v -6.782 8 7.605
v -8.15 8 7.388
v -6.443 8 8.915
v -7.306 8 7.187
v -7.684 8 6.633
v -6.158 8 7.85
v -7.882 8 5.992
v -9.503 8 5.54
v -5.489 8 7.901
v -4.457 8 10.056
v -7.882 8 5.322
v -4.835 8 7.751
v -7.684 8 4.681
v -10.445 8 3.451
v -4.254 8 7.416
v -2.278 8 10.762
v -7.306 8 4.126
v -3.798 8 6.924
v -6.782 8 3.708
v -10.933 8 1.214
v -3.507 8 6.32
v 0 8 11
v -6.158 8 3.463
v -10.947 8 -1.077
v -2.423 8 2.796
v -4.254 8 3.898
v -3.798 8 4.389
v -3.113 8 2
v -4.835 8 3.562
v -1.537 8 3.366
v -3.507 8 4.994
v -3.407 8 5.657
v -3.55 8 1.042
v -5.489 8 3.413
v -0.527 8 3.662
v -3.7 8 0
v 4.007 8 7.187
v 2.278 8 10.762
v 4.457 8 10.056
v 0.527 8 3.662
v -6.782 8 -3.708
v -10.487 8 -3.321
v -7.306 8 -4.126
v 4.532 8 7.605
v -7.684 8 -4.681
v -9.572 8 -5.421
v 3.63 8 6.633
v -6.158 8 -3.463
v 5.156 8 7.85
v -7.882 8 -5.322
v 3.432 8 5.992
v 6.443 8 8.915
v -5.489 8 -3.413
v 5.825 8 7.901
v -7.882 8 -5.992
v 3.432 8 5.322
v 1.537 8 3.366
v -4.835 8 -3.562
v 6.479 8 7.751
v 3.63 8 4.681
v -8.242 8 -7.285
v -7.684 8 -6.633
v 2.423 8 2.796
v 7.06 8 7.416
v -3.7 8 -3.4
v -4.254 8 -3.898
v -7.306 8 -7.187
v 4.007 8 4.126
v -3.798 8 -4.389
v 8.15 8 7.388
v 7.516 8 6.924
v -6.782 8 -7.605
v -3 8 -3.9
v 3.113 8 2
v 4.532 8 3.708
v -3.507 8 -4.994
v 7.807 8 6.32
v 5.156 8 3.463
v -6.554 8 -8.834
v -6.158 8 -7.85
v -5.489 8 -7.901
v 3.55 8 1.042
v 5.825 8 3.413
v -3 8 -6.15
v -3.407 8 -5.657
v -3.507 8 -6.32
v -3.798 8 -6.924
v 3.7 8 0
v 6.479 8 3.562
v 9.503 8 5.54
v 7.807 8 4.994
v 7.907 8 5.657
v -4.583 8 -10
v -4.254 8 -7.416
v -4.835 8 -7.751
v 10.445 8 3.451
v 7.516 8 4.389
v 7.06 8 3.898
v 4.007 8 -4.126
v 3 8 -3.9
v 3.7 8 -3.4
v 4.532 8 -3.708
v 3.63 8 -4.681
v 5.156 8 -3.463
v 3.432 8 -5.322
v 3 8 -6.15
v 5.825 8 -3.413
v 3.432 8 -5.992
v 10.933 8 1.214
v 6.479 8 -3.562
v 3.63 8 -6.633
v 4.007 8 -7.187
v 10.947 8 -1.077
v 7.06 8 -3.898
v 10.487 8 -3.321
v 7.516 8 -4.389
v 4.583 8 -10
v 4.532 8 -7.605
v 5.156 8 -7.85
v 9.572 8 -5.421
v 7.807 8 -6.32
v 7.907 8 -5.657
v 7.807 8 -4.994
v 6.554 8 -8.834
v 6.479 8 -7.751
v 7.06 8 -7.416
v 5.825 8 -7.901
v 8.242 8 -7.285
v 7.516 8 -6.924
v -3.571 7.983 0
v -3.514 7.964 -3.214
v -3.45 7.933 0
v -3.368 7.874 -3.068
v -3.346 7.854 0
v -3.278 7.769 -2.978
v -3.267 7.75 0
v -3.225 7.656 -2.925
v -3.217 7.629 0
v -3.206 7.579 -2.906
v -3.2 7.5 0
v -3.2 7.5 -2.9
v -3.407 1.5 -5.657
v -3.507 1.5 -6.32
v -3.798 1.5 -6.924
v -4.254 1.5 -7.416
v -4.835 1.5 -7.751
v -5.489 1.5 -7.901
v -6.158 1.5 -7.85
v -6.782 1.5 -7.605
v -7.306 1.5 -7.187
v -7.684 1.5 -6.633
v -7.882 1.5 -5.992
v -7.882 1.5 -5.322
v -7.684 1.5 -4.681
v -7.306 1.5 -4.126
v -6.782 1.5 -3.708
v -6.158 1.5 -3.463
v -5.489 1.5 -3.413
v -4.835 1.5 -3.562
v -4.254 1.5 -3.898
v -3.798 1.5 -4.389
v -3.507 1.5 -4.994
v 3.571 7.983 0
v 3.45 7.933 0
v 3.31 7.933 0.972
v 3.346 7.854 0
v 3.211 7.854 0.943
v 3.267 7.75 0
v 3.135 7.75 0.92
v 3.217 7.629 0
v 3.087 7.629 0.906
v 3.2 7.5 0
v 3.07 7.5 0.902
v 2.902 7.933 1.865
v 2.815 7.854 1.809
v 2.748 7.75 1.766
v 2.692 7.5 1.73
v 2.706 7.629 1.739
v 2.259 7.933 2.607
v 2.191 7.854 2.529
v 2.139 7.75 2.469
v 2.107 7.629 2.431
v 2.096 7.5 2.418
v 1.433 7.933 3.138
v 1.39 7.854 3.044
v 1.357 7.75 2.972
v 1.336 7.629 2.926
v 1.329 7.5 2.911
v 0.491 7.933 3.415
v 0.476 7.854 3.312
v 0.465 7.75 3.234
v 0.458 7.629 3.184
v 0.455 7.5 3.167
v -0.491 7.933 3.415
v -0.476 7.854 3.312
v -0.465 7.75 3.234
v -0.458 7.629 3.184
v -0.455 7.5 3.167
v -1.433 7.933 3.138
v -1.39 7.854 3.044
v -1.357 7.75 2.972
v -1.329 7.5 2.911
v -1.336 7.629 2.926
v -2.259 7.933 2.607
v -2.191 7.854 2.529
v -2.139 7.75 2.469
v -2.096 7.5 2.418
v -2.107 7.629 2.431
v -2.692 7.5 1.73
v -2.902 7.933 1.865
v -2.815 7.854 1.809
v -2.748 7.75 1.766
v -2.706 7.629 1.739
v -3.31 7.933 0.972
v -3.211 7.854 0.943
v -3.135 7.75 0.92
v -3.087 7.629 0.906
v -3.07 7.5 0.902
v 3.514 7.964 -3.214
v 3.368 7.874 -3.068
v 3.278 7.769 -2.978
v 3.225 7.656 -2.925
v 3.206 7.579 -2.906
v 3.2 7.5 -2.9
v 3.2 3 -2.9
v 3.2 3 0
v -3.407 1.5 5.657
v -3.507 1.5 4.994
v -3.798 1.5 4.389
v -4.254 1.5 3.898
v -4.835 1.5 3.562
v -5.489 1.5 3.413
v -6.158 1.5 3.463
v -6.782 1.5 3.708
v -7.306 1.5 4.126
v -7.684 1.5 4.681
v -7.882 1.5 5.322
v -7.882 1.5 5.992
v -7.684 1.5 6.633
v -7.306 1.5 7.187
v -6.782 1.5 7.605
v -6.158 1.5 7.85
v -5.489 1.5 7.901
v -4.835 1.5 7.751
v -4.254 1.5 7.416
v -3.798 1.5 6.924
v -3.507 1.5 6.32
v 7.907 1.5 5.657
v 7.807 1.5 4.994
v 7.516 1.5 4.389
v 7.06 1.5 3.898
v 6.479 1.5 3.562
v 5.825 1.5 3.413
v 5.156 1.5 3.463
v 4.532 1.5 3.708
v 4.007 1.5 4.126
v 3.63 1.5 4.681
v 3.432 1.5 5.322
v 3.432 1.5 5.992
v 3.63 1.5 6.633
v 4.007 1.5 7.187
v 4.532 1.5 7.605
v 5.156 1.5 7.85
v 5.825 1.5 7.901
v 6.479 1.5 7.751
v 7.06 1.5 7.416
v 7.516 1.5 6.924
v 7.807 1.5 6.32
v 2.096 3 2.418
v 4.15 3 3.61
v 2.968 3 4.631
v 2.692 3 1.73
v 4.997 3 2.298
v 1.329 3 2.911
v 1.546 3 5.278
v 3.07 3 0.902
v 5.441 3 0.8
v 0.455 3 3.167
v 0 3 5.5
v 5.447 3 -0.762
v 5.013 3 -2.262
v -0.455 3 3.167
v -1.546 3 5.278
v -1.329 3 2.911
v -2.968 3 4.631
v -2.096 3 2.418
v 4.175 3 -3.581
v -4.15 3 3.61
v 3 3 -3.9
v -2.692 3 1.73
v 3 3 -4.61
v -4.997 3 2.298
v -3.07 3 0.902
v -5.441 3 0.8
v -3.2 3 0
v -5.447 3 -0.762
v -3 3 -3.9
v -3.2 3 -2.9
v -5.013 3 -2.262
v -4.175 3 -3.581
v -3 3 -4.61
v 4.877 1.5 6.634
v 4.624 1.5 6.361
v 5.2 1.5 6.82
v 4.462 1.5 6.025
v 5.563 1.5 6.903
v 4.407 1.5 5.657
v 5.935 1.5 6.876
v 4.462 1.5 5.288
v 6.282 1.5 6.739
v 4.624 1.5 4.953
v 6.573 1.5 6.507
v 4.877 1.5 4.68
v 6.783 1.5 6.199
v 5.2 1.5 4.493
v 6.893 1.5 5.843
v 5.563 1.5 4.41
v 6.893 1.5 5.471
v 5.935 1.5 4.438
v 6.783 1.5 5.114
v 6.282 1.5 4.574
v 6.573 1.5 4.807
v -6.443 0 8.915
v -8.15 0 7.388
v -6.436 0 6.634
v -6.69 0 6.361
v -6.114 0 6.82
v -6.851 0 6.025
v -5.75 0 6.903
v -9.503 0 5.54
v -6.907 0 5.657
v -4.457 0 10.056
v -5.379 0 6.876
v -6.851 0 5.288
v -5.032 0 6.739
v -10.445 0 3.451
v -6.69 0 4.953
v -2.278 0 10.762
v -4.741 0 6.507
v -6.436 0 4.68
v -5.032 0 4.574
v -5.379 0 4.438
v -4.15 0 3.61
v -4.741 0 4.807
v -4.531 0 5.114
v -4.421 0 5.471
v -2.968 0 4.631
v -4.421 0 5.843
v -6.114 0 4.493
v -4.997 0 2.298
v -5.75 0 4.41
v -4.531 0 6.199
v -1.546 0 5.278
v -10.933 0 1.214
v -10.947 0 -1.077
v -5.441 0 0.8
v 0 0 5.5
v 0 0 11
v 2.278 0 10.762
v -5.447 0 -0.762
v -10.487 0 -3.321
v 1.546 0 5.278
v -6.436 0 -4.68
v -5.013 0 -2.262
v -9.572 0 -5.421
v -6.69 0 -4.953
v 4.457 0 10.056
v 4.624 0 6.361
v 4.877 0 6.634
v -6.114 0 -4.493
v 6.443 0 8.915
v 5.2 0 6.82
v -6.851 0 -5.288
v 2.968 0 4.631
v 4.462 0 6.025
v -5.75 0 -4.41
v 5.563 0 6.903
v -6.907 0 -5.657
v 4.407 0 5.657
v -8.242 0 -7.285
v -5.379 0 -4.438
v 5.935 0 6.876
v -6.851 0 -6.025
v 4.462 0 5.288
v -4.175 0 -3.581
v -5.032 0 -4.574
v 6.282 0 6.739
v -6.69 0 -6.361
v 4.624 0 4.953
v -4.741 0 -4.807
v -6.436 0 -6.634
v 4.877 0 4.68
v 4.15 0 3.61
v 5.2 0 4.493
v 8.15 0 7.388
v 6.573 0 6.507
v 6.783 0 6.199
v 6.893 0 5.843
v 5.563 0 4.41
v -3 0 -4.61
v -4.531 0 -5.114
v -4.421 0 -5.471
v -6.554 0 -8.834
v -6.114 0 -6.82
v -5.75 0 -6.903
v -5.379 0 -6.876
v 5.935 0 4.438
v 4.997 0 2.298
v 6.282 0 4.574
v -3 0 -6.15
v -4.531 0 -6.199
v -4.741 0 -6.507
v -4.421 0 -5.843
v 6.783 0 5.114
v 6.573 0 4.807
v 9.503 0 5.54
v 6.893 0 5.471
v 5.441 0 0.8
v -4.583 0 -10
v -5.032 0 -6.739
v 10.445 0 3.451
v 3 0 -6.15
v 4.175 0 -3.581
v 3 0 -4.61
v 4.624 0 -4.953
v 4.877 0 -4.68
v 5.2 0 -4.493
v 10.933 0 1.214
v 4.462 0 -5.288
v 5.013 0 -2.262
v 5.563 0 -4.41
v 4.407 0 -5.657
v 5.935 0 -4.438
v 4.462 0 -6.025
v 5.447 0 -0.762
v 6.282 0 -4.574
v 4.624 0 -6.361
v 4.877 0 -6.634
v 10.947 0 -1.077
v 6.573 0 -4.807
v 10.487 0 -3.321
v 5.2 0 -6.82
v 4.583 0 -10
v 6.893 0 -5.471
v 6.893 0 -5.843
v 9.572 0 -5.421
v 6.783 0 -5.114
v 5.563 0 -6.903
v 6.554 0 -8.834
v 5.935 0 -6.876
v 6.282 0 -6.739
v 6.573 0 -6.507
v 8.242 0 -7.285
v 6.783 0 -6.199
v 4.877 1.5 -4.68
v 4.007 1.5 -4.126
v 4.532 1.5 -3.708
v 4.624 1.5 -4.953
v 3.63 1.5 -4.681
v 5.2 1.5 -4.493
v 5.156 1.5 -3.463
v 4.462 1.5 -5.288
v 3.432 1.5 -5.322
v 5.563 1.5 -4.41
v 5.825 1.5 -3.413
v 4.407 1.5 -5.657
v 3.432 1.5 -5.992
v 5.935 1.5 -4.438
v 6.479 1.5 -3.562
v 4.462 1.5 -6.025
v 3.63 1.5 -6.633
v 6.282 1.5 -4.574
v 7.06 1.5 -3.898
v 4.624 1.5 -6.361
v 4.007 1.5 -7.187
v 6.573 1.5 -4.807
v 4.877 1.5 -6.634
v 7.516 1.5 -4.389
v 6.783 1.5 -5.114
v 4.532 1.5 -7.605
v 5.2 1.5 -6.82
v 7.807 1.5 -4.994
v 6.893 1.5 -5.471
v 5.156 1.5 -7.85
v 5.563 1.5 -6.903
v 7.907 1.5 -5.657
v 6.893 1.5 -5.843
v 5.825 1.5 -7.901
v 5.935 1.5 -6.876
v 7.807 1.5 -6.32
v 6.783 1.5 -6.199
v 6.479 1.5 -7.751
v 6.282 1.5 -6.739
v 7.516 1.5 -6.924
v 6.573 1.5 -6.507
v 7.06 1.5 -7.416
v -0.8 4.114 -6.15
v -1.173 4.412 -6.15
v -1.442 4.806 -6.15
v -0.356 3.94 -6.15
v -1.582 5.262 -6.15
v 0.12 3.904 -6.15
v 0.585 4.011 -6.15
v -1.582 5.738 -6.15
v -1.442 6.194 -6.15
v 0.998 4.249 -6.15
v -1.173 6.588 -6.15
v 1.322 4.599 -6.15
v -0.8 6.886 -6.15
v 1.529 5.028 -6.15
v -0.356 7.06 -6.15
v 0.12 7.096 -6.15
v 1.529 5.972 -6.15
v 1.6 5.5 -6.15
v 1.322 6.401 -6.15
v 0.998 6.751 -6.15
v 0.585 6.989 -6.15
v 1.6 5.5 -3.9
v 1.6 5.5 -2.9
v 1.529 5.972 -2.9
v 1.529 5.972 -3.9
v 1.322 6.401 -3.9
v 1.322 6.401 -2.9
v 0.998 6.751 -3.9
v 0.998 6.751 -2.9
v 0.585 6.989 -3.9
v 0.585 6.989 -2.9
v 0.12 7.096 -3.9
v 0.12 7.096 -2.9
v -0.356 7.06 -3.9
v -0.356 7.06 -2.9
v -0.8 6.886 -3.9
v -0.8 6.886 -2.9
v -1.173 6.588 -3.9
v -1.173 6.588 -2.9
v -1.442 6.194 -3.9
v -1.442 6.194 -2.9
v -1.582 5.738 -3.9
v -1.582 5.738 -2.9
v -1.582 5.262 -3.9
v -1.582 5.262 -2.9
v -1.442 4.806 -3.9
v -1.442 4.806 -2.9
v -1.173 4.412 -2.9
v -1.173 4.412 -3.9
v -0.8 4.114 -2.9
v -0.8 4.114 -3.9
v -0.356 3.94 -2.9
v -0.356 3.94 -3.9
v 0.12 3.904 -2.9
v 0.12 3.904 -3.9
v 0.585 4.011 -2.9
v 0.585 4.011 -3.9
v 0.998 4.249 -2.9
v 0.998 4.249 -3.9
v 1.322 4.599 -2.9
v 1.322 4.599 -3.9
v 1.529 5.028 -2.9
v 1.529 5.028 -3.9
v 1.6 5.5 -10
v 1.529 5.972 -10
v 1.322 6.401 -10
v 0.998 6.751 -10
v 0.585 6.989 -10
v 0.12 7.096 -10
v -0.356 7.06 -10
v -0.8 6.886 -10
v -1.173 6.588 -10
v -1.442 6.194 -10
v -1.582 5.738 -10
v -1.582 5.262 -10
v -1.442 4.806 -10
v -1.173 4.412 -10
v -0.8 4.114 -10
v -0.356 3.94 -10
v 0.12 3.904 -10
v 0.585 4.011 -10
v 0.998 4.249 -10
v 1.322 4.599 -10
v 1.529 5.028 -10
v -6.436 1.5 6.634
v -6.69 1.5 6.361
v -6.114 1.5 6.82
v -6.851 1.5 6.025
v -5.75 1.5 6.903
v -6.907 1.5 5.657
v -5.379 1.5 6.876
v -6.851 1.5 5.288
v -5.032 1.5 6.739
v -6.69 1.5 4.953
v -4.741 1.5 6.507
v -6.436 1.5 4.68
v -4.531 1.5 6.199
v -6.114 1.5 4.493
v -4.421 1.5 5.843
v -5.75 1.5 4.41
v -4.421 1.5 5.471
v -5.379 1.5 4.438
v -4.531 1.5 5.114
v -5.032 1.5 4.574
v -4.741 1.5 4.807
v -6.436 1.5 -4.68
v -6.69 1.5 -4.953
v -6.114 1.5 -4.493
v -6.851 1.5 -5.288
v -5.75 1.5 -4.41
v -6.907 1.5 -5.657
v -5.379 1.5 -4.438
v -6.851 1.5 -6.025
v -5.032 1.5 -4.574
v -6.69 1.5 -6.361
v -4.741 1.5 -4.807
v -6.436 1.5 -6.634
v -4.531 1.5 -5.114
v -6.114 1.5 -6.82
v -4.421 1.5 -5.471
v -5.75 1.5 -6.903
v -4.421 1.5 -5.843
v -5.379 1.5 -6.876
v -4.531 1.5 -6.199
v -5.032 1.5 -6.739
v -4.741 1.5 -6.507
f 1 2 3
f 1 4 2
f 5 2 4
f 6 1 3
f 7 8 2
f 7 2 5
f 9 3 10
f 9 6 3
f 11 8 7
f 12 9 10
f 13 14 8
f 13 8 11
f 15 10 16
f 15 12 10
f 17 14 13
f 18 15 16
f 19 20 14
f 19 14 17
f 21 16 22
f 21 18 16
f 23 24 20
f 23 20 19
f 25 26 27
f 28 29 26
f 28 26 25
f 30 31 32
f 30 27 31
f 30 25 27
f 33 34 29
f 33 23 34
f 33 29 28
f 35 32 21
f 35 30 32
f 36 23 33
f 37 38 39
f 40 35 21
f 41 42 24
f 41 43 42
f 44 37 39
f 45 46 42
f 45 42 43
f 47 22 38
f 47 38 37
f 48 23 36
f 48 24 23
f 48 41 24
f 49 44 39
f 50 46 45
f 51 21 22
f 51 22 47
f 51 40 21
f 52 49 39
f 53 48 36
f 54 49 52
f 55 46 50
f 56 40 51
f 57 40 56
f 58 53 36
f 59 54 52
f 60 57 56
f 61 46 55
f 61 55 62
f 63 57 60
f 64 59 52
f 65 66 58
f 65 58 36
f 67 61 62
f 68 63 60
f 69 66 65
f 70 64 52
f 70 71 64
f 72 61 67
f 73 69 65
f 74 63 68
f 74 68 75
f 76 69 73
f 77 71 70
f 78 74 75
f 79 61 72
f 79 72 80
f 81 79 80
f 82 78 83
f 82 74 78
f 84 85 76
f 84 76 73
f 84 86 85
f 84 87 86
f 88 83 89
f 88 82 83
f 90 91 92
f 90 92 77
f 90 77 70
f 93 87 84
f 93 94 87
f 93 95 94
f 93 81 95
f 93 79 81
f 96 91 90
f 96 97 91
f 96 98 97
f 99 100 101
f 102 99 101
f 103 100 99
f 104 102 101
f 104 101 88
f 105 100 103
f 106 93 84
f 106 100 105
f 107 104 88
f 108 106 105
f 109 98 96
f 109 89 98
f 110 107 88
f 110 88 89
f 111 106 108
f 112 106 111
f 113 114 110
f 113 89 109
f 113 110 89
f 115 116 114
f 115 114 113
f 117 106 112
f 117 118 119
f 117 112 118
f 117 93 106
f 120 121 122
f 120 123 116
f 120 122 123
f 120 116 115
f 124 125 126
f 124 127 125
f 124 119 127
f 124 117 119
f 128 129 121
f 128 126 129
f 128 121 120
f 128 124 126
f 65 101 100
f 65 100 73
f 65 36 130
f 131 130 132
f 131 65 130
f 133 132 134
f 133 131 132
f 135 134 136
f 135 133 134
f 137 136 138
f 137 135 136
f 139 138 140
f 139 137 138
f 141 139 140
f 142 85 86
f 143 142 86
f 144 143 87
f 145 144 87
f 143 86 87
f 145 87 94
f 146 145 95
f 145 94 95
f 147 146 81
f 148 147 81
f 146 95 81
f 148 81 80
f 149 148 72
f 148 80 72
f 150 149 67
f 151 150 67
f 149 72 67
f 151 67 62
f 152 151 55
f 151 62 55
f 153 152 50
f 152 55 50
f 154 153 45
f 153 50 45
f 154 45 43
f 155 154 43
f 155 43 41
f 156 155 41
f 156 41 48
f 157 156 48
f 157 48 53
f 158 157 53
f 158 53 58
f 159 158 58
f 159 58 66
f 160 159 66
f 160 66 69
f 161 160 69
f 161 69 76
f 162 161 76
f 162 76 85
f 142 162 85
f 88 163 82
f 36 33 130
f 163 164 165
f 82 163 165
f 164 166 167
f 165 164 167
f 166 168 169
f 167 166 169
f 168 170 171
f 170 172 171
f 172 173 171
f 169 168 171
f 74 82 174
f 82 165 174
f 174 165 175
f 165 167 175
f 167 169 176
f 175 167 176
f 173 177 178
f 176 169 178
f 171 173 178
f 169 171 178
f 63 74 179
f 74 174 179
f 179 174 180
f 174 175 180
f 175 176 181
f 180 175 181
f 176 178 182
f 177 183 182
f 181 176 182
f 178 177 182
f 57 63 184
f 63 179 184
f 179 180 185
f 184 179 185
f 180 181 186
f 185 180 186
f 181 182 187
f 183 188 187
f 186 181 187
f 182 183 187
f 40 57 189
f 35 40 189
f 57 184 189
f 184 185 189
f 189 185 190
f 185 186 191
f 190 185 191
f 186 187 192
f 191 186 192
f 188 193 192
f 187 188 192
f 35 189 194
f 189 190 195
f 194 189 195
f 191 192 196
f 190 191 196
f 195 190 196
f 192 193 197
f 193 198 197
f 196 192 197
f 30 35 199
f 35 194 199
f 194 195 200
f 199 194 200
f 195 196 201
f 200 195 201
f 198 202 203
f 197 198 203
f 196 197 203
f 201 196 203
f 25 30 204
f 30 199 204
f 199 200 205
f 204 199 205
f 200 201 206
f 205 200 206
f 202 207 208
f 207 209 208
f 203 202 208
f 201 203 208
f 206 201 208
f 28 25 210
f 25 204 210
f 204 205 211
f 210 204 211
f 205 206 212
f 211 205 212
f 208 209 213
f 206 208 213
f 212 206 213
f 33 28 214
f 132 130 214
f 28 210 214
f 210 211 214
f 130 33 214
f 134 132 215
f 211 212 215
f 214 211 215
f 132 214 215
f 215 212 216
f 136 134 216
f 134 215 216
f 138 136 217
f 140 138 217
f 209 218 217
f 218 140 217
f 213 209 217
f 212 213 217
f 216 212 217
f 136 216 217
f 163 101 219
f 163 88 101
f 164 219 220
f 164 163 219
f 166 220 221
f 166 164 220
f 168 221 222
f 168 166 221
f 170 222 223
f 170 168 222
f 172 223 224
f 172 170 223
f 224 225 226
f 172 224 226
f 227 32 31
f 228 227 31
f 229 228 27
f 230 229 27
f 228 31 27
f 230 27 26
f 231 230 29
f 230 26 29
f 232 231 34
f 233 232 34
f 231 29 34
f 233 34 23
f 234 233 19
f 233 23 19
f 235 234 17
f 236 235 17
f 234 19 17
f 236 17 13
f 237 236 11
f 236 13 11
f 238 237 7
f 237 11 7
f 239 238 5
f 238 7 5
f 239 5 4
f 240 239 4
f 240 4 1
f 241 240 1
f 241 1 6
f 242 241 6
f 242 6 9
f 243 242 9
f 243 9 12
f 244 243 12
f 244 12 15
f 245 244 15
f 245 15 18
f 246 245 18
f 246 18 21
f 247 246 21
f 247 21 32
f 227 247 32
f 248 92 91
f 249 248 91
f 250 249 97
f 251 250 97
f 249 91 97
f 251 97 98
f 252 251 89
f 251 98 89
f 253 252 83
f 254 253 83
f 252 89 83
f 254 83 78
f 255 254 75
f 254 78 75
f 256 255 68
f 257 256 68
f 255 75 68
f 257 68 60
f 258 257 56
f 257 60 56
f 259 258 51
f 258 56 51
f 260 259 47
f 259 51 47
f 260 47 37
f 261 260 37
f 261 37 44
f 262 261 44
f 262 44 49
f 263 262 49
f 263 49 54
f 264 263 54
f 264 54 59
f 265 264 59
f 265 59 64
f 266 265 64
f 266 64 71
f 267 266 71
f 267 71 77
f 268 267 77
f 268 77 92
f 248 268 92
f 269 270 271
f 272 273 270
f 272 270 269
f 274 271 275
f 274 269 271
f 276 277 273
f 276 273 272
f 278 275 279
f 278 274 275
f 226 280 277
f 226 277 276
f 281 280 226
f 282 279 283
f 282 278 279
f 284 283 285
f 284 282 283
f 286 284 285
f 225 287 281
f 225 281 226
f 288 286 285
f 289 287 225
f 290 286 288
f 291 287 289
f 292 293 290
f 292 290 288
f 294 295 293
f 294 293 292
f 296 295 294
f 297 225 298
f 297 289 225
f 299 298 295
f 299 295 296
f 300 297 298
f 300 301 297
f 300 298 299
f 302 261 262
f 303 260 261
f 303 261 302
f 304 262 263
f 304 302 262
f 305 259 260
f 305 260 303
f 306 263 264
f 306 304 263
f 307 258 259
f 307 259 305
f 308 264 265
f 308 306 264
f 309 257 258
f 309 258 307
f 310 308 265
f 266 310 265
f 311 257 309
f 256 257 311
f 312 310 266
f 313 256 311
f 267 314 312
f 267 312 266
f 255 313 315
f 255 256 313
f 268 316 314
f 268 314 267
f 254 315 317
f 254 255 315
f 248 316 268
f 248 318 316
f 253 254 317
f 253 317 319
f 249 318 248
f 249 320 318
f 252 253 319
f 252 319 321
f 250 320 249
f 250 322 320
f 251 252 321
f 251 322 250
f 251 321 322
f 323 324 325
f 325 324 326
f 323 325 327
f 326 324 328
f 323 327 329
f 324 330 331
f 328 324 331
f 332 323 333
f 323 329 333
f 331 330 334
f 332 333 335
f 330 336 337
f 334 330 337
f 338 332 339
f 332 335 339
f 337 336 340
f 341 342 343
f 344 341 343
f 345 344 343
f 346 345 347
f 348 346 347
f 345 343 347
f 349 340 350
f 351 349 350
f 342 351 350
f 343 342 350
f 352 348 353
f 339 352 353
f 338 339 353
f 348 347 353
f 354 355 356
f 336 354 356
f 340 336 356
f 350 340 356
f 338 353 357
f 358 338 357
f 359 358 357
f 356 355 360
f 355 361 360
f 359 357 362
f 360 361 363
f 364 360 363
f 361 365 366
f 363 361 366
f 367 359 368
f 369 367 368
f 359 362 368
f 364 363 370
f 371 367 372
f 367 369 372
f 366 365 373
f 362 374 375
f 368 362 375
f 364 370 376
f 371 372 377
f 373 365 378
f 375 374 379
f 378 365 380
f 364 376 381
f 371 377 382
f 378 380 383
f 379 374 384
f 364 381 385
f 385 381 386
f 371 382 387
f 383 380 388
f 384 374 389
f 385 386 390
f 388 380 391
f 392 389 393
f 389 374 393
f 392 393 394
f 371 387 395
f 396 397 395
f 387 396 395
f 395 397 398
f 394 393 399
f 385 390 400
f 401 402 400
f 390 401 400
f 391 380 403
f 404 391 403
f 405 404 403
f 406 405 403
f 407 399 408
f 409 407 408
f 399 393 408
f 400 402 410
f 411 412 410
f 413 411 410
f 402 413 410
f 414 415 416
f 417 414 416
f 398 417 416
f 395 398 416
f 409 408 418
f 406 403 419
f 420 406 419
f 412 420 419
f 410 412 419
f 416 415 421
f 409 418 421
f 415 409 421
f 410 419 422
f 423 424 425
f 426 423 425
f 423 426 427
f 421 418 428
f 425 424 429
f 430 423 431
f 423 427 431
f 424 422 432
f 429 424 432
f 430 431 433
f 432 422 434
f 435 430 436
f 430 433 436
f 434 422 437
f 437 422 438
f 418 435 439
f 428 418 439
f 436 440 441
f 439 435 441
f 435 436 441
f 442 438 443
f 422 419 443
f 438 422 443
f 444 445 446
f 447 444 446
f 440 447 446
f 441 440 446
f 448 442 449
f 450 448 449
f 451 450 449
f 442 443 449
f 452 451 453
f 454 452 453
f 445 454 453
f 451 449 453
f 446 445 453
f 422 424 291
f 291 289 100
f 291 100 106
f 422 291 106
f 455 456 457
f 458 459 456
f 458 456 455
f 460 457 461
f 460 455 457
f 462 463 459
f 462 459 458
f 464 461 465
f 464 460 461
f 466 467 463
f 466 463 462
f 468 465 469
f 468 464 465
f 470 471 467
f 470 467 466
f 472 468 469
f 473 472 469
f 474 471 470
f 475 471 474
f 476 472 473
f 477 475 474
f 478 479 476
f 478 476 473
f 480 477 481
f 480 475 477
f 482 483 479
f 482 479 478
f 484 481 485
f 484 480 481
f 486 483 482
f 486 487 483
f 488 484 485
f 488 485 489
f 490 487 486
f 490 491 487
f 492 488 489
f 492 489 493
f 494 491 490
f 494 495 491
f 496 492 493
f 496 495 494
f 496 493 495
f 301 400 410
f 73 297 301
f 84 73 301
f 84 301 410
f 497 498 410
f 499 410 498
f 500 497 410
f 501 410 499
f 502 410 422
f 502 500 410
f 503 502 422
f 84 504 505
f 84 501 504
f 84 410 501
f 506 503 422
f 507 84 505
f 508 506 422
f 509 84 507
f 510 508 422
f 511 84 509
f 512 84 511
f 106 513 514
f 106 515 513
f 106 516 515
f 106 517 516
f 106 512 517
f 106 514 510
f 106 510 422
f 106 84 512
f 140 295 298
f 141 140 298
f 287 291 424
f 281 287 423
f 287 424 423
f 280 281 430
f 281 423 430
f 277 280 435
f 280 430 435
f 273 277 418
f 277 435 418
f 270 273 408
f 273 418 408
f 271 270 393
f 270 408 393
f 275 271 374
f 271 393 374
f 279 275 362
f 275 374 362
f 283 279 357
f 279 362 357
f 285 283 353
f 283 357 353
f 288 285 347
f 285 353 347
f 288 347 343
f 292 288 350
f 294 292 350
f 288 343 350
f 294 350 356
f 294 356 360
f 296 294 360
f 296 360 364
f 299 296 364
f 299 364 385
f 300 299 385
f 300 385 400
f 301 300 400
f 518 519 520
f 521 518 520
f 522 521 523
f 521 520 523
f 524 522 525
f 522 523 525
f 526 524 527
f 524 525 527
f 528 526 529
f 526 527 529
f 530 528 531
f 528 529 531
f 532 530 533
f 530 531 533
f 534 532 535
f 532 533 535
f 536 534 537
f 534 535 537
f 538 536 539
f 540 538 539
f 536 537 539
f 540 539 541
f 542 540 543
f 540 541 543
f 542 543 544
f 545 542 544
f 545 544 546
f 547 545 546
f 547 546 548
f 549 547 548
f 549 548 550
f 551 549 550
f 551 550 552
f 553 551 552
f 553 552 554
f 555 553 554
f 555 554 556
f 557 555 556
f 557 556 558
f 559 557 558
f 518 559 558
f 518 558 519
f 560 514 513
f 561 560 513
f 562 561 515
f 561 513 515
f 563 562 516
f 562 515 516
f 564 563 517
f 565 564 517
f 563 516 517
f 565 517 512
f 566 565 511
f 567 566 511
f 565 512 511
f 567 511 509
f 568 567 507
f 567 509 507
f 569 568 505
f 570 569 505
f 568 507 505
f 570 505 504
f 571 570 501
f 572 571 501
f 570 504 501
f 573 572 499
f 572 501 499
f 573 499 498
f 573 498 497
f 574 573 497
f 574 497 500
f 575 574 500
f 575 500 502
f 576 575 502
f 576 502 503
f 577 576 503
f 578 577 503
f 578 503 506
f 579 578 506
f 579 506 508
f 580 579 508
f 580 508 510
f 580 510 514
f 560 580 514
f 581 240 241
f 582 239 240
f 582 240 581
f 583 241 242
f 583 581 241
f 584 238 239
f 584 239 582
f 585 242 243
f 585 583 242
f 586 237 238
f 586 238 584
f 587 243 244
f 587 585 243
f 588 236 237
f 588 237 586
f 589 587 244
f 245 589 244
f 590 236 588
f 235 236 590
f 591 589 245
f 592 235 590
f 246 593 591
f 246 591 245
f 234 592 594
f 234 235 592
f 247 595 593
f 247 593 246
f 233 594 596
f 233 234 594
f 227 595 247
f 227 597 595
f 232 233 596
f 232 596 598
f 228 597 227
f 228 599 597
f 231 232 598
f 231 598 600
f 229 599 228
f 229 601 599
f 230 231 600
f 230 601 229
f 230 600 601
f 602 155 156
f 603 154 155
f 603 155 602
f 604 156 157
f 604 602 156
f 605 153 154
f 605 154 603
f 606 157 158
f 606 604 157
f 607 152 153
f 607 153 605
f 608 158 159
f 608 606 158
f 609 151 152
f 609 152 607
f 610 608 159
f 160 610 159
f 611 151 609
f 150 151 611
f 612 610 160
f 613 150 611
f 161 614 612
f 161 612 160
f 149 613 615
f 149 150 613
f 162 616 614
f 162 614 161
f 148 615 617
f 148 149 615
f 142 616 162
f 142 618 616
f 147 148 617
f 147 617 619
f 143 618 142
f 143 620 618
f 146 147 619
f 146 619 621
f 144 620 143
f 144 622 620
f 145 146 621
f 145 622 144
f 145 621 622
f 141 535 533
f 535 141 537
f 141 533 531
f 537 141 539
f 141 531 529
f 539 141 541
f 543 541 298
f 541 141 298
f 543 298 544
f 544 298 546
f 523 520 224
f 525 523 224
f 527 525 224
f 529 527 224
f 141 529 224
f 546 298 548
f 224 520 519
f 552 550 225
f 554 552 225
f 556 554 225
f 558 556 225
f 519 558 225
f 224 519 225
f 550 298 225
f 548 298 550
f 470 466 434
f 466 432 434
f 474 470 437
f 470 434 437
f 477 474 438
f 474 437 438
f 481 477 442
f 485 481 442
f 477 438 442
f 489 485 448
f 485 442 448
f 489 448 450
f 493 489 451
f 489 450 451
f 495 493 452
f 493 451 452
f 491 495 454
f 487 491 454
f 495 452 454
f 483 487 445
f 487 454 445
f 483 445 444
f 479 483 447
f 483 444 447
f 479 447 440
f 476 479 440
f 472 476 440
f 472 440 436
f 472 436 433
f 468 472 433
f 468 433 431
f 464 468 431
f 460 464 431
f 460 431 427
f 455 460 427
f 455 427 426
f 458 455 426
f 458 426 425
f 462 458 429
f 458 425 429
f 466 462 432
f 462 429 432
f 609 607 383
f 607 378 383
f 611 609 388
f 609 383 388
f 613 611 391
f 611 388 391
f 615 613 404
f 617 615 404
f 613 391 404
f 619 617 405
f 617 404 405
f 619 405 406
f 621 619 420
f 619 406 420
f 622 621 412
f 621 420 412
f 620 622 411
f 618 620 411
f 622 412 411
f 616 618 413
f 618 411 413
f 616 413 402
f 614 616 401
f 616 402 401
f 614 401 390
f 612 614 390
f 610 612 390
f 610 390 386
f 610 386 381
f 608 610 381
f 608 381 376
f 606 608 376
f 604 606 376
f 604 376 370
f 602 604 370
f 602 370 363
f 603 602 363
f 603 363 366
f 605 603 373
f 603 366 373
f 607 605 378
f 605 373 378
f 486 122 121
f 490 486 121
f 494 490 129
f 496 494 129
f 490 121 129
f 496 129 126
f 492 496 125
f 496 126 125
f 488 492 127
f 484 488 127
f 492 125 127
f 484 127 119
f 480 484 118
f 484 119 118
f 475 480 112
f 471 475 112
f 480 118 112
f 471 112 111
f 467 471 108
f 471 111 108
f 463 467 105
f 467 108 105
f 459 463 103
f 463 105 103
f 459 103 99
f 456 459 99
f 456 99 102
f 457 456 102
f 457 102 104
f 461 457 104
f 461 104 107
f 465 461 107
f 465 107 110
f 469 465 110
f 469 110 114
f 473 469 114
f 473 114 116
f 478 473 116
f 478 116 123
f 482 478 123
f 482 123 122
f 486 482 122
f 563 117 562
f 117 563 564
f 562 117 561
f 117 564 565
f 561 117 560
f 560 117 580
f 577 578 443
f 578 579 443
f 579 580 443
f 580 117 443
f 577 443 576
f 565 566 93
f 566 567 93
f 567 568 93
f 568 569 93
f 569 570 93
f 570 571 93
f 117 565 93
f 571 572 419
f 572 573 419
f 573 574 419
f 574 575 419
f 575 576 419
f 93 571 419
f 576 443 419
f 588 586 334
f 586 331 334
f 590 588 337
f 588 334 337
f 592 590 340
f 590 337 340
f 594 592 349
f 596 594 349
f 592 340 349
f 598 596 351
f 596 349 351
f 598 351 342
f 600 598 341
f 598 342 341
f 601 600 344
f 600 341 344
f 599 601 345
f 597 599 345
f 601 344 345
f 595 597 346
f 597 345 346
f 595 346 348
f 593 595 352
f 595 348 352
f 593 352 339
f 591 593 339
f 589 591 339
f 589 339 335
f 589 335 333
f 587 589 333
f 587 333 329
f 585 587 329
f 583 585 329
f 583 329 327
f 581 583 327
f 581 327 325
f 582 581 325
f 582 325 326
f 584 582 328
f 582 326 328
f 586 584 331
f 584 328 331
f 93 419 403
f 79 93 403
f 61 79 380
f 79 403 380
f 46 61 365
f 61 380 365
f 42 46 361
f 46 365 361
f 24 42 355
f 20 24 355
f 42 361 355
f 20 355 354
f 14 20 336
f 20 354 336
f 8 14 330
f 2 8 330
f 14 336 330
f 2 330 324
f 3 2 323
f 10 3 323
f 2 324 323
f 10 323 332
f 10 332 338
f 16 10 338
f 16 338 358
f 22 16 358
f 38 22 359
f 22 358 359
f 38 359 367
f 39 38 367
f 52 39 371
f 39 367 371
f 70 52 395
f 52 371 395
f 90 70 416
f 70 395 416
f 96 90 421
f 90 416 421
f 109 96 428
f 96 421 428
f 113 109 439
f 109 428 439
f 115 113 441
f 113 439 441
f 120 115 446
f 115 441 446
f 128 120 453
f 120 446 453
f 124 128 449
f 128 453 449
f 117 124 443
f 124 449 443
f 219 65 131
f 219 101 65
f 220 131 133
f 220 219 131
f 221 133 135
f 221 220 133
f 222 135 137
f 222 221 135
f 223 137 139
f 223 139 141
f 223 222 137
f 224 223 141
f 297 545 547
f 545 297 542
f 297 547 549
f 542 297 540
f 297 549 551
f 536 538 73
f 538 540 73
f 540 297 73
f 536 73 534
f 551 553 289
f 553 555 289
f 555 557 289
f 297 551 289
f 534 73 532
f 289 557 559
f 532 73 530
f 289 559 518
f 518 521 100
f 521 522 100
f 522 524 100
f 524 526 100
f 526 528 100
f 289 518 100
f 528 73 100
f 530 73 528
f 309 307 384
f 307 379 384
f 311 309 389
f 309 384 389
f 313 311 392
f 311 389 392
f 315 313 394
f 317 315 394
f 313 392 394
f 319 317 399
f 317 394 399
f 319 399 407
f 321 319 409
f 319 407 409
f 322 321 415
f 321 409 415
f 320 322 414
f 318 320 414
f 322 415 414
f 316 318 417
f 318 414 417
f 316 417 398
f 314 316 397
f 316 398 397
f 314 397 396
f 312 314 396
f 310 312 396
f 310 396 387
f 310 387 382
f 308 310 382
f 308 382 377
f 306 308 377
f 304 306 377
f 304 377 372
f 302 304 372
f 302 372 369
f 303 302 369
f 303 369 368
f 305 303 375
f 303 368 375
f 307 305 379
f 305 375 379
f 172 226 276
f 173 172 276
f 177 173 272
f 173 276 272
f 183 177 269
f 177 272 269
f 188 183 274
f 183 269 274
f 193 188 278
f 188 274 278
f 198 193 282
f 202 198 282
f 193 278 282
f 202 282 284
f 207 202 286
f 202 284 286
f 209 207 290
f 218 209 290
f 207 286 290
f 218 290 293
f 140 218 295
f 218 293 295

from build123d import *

# Parameters (mm, degrees)
BOSS_EXTRU_1_DEPTH                              = 8
CHAMBRAGE_POUR_VIS_T_TE_CYLINDRIQUE_D           = 2.5
CHAMBRAGE_POUR_VIS_T_TE_CYLINDRIQUE_CBORE_D     = 4.5
CHAMBRAGE_POUR_VIS_T_TE_CYLINDRIQUE_CBORE_DEPTH = 6.5
CONG_1_R                                        = 0.5
ESQUISSE6_R                                     = 1.6
ENL_V_MAT_EXTRU_1_DEPTH                         = 18.49285573
ESQUISSE7_W                                     = 6
ESQUISSE7_H                                     = 2.25
ENL_V_MAT_EXTRU_2_DEPTH                         = 18.492855685
ESQUISSE8_R                                     = 5.5
ENL_V_MAT_EXTRU_3_DEPTH                         = 3


with BuildPart() as part:
    # Esquisse1 → Boss.-Extru.1 (new body)
    with BuildSketch(Plane(origin=(0, 0, 0), x_dir=(1, 0, 0), z_dir=(0, 1, 0))):
        with BuildLine():
            Line((4.582575695, 10), (-4.582575695, 10))
            ThreePointArc((-4.582575695, 10), (0, -11), (4.582575695, 10))
        make_face()
        with BuildLine():
            Line((-3.2, 0), (-3.2, 2.9))
            Line((-3.2, 2.9), (3.2, 2.9))
            Line((3.2, 2.9), (3.2, 0))
            ThreePointArc((3.2, 0), (0, -3.2), (-3.2, 0))
        make_face(mode=Mode.SUBTRACT)
    extrude(amount=BOSS_EXTRU_1_DEPTH)

    # Chambrage pour vis à tête cylindrique à 6 pans creux (ou vis CHC) M21 (through all)
    with Locations(Plane(origin=(0, 8, 0), x_dir=(1, 0, 0), z_dir=(0, 1, 0))):
        with Locations((5.656854249, 5.656854249), (5.656854249, -5.656854249), (-5.656854249, -5.656854249), (-5.656854249, 5.656854249), (0, 0)):
            CounterBoreHole(CHAMBRAGE_POUR_VIS_T_TE_CYLINDRIQUE_D / 2, CHAMBRAGE_POUR_VIS_T_TE_CYLINDRIQUE_CBORE_D / 2, CHAMBRAGE_POUR_VIS_T_TE_CYLINDRIQUE_CBORE_DEPTH)

    # Congé1
    cong_1_edges = [part.edges().sort_by_distance(p)[0] for p in [
        (0, 8, 3.2),
        (3.2, 8, -1.45),
        (0, 8, -2.9),
        (-3.2, 8, -1.45),
    ]]
    fillet(cong_1_edges, radius=CONG_1_R)

    # Esquisse6 → Enlèv. mat.-Extru.1 (cut, through all)
    with BuildSketch(Plane.XY):
        with Locations((0, 5.5)):
            Circle(ESQUISSE6_R)
    extrude(amount=-ENL_V_MAT_EXTRU_1_DEPTH, mode=Mode.SUBTRACT)

    # Esquisse7 → Enlèv. mat.-Extru.2 (cut, through all)
    with BuildSketch(Plane(origin=(0, 8, 0), x_dir=(1, 0, 0), z_dir=(0, 1, 0))):
        with Locations((0, 5.025)):
            Rectangle(ESQUISSE7_W, ESQUISSE7_H)
    extrude(amount=-ENL_V_MAT_EXTRU_2_DEPTH, mode=Mode.SUBTRACT)

    # Esquisse8 → Enlèv. mat.-Extru.3 (cut)
    with BuildSketch(Plane(origin=(0, 0, 0), x_dir=(-1, 0, 0), z_dir=(0, -1, 0))):
        Circle(ESQUISSE8_R)
    extrude(amount=-ENL_V_MAT_EXTRU_3_DEPTH, mode=Mode.SUBTRACT)


solid = part.part
